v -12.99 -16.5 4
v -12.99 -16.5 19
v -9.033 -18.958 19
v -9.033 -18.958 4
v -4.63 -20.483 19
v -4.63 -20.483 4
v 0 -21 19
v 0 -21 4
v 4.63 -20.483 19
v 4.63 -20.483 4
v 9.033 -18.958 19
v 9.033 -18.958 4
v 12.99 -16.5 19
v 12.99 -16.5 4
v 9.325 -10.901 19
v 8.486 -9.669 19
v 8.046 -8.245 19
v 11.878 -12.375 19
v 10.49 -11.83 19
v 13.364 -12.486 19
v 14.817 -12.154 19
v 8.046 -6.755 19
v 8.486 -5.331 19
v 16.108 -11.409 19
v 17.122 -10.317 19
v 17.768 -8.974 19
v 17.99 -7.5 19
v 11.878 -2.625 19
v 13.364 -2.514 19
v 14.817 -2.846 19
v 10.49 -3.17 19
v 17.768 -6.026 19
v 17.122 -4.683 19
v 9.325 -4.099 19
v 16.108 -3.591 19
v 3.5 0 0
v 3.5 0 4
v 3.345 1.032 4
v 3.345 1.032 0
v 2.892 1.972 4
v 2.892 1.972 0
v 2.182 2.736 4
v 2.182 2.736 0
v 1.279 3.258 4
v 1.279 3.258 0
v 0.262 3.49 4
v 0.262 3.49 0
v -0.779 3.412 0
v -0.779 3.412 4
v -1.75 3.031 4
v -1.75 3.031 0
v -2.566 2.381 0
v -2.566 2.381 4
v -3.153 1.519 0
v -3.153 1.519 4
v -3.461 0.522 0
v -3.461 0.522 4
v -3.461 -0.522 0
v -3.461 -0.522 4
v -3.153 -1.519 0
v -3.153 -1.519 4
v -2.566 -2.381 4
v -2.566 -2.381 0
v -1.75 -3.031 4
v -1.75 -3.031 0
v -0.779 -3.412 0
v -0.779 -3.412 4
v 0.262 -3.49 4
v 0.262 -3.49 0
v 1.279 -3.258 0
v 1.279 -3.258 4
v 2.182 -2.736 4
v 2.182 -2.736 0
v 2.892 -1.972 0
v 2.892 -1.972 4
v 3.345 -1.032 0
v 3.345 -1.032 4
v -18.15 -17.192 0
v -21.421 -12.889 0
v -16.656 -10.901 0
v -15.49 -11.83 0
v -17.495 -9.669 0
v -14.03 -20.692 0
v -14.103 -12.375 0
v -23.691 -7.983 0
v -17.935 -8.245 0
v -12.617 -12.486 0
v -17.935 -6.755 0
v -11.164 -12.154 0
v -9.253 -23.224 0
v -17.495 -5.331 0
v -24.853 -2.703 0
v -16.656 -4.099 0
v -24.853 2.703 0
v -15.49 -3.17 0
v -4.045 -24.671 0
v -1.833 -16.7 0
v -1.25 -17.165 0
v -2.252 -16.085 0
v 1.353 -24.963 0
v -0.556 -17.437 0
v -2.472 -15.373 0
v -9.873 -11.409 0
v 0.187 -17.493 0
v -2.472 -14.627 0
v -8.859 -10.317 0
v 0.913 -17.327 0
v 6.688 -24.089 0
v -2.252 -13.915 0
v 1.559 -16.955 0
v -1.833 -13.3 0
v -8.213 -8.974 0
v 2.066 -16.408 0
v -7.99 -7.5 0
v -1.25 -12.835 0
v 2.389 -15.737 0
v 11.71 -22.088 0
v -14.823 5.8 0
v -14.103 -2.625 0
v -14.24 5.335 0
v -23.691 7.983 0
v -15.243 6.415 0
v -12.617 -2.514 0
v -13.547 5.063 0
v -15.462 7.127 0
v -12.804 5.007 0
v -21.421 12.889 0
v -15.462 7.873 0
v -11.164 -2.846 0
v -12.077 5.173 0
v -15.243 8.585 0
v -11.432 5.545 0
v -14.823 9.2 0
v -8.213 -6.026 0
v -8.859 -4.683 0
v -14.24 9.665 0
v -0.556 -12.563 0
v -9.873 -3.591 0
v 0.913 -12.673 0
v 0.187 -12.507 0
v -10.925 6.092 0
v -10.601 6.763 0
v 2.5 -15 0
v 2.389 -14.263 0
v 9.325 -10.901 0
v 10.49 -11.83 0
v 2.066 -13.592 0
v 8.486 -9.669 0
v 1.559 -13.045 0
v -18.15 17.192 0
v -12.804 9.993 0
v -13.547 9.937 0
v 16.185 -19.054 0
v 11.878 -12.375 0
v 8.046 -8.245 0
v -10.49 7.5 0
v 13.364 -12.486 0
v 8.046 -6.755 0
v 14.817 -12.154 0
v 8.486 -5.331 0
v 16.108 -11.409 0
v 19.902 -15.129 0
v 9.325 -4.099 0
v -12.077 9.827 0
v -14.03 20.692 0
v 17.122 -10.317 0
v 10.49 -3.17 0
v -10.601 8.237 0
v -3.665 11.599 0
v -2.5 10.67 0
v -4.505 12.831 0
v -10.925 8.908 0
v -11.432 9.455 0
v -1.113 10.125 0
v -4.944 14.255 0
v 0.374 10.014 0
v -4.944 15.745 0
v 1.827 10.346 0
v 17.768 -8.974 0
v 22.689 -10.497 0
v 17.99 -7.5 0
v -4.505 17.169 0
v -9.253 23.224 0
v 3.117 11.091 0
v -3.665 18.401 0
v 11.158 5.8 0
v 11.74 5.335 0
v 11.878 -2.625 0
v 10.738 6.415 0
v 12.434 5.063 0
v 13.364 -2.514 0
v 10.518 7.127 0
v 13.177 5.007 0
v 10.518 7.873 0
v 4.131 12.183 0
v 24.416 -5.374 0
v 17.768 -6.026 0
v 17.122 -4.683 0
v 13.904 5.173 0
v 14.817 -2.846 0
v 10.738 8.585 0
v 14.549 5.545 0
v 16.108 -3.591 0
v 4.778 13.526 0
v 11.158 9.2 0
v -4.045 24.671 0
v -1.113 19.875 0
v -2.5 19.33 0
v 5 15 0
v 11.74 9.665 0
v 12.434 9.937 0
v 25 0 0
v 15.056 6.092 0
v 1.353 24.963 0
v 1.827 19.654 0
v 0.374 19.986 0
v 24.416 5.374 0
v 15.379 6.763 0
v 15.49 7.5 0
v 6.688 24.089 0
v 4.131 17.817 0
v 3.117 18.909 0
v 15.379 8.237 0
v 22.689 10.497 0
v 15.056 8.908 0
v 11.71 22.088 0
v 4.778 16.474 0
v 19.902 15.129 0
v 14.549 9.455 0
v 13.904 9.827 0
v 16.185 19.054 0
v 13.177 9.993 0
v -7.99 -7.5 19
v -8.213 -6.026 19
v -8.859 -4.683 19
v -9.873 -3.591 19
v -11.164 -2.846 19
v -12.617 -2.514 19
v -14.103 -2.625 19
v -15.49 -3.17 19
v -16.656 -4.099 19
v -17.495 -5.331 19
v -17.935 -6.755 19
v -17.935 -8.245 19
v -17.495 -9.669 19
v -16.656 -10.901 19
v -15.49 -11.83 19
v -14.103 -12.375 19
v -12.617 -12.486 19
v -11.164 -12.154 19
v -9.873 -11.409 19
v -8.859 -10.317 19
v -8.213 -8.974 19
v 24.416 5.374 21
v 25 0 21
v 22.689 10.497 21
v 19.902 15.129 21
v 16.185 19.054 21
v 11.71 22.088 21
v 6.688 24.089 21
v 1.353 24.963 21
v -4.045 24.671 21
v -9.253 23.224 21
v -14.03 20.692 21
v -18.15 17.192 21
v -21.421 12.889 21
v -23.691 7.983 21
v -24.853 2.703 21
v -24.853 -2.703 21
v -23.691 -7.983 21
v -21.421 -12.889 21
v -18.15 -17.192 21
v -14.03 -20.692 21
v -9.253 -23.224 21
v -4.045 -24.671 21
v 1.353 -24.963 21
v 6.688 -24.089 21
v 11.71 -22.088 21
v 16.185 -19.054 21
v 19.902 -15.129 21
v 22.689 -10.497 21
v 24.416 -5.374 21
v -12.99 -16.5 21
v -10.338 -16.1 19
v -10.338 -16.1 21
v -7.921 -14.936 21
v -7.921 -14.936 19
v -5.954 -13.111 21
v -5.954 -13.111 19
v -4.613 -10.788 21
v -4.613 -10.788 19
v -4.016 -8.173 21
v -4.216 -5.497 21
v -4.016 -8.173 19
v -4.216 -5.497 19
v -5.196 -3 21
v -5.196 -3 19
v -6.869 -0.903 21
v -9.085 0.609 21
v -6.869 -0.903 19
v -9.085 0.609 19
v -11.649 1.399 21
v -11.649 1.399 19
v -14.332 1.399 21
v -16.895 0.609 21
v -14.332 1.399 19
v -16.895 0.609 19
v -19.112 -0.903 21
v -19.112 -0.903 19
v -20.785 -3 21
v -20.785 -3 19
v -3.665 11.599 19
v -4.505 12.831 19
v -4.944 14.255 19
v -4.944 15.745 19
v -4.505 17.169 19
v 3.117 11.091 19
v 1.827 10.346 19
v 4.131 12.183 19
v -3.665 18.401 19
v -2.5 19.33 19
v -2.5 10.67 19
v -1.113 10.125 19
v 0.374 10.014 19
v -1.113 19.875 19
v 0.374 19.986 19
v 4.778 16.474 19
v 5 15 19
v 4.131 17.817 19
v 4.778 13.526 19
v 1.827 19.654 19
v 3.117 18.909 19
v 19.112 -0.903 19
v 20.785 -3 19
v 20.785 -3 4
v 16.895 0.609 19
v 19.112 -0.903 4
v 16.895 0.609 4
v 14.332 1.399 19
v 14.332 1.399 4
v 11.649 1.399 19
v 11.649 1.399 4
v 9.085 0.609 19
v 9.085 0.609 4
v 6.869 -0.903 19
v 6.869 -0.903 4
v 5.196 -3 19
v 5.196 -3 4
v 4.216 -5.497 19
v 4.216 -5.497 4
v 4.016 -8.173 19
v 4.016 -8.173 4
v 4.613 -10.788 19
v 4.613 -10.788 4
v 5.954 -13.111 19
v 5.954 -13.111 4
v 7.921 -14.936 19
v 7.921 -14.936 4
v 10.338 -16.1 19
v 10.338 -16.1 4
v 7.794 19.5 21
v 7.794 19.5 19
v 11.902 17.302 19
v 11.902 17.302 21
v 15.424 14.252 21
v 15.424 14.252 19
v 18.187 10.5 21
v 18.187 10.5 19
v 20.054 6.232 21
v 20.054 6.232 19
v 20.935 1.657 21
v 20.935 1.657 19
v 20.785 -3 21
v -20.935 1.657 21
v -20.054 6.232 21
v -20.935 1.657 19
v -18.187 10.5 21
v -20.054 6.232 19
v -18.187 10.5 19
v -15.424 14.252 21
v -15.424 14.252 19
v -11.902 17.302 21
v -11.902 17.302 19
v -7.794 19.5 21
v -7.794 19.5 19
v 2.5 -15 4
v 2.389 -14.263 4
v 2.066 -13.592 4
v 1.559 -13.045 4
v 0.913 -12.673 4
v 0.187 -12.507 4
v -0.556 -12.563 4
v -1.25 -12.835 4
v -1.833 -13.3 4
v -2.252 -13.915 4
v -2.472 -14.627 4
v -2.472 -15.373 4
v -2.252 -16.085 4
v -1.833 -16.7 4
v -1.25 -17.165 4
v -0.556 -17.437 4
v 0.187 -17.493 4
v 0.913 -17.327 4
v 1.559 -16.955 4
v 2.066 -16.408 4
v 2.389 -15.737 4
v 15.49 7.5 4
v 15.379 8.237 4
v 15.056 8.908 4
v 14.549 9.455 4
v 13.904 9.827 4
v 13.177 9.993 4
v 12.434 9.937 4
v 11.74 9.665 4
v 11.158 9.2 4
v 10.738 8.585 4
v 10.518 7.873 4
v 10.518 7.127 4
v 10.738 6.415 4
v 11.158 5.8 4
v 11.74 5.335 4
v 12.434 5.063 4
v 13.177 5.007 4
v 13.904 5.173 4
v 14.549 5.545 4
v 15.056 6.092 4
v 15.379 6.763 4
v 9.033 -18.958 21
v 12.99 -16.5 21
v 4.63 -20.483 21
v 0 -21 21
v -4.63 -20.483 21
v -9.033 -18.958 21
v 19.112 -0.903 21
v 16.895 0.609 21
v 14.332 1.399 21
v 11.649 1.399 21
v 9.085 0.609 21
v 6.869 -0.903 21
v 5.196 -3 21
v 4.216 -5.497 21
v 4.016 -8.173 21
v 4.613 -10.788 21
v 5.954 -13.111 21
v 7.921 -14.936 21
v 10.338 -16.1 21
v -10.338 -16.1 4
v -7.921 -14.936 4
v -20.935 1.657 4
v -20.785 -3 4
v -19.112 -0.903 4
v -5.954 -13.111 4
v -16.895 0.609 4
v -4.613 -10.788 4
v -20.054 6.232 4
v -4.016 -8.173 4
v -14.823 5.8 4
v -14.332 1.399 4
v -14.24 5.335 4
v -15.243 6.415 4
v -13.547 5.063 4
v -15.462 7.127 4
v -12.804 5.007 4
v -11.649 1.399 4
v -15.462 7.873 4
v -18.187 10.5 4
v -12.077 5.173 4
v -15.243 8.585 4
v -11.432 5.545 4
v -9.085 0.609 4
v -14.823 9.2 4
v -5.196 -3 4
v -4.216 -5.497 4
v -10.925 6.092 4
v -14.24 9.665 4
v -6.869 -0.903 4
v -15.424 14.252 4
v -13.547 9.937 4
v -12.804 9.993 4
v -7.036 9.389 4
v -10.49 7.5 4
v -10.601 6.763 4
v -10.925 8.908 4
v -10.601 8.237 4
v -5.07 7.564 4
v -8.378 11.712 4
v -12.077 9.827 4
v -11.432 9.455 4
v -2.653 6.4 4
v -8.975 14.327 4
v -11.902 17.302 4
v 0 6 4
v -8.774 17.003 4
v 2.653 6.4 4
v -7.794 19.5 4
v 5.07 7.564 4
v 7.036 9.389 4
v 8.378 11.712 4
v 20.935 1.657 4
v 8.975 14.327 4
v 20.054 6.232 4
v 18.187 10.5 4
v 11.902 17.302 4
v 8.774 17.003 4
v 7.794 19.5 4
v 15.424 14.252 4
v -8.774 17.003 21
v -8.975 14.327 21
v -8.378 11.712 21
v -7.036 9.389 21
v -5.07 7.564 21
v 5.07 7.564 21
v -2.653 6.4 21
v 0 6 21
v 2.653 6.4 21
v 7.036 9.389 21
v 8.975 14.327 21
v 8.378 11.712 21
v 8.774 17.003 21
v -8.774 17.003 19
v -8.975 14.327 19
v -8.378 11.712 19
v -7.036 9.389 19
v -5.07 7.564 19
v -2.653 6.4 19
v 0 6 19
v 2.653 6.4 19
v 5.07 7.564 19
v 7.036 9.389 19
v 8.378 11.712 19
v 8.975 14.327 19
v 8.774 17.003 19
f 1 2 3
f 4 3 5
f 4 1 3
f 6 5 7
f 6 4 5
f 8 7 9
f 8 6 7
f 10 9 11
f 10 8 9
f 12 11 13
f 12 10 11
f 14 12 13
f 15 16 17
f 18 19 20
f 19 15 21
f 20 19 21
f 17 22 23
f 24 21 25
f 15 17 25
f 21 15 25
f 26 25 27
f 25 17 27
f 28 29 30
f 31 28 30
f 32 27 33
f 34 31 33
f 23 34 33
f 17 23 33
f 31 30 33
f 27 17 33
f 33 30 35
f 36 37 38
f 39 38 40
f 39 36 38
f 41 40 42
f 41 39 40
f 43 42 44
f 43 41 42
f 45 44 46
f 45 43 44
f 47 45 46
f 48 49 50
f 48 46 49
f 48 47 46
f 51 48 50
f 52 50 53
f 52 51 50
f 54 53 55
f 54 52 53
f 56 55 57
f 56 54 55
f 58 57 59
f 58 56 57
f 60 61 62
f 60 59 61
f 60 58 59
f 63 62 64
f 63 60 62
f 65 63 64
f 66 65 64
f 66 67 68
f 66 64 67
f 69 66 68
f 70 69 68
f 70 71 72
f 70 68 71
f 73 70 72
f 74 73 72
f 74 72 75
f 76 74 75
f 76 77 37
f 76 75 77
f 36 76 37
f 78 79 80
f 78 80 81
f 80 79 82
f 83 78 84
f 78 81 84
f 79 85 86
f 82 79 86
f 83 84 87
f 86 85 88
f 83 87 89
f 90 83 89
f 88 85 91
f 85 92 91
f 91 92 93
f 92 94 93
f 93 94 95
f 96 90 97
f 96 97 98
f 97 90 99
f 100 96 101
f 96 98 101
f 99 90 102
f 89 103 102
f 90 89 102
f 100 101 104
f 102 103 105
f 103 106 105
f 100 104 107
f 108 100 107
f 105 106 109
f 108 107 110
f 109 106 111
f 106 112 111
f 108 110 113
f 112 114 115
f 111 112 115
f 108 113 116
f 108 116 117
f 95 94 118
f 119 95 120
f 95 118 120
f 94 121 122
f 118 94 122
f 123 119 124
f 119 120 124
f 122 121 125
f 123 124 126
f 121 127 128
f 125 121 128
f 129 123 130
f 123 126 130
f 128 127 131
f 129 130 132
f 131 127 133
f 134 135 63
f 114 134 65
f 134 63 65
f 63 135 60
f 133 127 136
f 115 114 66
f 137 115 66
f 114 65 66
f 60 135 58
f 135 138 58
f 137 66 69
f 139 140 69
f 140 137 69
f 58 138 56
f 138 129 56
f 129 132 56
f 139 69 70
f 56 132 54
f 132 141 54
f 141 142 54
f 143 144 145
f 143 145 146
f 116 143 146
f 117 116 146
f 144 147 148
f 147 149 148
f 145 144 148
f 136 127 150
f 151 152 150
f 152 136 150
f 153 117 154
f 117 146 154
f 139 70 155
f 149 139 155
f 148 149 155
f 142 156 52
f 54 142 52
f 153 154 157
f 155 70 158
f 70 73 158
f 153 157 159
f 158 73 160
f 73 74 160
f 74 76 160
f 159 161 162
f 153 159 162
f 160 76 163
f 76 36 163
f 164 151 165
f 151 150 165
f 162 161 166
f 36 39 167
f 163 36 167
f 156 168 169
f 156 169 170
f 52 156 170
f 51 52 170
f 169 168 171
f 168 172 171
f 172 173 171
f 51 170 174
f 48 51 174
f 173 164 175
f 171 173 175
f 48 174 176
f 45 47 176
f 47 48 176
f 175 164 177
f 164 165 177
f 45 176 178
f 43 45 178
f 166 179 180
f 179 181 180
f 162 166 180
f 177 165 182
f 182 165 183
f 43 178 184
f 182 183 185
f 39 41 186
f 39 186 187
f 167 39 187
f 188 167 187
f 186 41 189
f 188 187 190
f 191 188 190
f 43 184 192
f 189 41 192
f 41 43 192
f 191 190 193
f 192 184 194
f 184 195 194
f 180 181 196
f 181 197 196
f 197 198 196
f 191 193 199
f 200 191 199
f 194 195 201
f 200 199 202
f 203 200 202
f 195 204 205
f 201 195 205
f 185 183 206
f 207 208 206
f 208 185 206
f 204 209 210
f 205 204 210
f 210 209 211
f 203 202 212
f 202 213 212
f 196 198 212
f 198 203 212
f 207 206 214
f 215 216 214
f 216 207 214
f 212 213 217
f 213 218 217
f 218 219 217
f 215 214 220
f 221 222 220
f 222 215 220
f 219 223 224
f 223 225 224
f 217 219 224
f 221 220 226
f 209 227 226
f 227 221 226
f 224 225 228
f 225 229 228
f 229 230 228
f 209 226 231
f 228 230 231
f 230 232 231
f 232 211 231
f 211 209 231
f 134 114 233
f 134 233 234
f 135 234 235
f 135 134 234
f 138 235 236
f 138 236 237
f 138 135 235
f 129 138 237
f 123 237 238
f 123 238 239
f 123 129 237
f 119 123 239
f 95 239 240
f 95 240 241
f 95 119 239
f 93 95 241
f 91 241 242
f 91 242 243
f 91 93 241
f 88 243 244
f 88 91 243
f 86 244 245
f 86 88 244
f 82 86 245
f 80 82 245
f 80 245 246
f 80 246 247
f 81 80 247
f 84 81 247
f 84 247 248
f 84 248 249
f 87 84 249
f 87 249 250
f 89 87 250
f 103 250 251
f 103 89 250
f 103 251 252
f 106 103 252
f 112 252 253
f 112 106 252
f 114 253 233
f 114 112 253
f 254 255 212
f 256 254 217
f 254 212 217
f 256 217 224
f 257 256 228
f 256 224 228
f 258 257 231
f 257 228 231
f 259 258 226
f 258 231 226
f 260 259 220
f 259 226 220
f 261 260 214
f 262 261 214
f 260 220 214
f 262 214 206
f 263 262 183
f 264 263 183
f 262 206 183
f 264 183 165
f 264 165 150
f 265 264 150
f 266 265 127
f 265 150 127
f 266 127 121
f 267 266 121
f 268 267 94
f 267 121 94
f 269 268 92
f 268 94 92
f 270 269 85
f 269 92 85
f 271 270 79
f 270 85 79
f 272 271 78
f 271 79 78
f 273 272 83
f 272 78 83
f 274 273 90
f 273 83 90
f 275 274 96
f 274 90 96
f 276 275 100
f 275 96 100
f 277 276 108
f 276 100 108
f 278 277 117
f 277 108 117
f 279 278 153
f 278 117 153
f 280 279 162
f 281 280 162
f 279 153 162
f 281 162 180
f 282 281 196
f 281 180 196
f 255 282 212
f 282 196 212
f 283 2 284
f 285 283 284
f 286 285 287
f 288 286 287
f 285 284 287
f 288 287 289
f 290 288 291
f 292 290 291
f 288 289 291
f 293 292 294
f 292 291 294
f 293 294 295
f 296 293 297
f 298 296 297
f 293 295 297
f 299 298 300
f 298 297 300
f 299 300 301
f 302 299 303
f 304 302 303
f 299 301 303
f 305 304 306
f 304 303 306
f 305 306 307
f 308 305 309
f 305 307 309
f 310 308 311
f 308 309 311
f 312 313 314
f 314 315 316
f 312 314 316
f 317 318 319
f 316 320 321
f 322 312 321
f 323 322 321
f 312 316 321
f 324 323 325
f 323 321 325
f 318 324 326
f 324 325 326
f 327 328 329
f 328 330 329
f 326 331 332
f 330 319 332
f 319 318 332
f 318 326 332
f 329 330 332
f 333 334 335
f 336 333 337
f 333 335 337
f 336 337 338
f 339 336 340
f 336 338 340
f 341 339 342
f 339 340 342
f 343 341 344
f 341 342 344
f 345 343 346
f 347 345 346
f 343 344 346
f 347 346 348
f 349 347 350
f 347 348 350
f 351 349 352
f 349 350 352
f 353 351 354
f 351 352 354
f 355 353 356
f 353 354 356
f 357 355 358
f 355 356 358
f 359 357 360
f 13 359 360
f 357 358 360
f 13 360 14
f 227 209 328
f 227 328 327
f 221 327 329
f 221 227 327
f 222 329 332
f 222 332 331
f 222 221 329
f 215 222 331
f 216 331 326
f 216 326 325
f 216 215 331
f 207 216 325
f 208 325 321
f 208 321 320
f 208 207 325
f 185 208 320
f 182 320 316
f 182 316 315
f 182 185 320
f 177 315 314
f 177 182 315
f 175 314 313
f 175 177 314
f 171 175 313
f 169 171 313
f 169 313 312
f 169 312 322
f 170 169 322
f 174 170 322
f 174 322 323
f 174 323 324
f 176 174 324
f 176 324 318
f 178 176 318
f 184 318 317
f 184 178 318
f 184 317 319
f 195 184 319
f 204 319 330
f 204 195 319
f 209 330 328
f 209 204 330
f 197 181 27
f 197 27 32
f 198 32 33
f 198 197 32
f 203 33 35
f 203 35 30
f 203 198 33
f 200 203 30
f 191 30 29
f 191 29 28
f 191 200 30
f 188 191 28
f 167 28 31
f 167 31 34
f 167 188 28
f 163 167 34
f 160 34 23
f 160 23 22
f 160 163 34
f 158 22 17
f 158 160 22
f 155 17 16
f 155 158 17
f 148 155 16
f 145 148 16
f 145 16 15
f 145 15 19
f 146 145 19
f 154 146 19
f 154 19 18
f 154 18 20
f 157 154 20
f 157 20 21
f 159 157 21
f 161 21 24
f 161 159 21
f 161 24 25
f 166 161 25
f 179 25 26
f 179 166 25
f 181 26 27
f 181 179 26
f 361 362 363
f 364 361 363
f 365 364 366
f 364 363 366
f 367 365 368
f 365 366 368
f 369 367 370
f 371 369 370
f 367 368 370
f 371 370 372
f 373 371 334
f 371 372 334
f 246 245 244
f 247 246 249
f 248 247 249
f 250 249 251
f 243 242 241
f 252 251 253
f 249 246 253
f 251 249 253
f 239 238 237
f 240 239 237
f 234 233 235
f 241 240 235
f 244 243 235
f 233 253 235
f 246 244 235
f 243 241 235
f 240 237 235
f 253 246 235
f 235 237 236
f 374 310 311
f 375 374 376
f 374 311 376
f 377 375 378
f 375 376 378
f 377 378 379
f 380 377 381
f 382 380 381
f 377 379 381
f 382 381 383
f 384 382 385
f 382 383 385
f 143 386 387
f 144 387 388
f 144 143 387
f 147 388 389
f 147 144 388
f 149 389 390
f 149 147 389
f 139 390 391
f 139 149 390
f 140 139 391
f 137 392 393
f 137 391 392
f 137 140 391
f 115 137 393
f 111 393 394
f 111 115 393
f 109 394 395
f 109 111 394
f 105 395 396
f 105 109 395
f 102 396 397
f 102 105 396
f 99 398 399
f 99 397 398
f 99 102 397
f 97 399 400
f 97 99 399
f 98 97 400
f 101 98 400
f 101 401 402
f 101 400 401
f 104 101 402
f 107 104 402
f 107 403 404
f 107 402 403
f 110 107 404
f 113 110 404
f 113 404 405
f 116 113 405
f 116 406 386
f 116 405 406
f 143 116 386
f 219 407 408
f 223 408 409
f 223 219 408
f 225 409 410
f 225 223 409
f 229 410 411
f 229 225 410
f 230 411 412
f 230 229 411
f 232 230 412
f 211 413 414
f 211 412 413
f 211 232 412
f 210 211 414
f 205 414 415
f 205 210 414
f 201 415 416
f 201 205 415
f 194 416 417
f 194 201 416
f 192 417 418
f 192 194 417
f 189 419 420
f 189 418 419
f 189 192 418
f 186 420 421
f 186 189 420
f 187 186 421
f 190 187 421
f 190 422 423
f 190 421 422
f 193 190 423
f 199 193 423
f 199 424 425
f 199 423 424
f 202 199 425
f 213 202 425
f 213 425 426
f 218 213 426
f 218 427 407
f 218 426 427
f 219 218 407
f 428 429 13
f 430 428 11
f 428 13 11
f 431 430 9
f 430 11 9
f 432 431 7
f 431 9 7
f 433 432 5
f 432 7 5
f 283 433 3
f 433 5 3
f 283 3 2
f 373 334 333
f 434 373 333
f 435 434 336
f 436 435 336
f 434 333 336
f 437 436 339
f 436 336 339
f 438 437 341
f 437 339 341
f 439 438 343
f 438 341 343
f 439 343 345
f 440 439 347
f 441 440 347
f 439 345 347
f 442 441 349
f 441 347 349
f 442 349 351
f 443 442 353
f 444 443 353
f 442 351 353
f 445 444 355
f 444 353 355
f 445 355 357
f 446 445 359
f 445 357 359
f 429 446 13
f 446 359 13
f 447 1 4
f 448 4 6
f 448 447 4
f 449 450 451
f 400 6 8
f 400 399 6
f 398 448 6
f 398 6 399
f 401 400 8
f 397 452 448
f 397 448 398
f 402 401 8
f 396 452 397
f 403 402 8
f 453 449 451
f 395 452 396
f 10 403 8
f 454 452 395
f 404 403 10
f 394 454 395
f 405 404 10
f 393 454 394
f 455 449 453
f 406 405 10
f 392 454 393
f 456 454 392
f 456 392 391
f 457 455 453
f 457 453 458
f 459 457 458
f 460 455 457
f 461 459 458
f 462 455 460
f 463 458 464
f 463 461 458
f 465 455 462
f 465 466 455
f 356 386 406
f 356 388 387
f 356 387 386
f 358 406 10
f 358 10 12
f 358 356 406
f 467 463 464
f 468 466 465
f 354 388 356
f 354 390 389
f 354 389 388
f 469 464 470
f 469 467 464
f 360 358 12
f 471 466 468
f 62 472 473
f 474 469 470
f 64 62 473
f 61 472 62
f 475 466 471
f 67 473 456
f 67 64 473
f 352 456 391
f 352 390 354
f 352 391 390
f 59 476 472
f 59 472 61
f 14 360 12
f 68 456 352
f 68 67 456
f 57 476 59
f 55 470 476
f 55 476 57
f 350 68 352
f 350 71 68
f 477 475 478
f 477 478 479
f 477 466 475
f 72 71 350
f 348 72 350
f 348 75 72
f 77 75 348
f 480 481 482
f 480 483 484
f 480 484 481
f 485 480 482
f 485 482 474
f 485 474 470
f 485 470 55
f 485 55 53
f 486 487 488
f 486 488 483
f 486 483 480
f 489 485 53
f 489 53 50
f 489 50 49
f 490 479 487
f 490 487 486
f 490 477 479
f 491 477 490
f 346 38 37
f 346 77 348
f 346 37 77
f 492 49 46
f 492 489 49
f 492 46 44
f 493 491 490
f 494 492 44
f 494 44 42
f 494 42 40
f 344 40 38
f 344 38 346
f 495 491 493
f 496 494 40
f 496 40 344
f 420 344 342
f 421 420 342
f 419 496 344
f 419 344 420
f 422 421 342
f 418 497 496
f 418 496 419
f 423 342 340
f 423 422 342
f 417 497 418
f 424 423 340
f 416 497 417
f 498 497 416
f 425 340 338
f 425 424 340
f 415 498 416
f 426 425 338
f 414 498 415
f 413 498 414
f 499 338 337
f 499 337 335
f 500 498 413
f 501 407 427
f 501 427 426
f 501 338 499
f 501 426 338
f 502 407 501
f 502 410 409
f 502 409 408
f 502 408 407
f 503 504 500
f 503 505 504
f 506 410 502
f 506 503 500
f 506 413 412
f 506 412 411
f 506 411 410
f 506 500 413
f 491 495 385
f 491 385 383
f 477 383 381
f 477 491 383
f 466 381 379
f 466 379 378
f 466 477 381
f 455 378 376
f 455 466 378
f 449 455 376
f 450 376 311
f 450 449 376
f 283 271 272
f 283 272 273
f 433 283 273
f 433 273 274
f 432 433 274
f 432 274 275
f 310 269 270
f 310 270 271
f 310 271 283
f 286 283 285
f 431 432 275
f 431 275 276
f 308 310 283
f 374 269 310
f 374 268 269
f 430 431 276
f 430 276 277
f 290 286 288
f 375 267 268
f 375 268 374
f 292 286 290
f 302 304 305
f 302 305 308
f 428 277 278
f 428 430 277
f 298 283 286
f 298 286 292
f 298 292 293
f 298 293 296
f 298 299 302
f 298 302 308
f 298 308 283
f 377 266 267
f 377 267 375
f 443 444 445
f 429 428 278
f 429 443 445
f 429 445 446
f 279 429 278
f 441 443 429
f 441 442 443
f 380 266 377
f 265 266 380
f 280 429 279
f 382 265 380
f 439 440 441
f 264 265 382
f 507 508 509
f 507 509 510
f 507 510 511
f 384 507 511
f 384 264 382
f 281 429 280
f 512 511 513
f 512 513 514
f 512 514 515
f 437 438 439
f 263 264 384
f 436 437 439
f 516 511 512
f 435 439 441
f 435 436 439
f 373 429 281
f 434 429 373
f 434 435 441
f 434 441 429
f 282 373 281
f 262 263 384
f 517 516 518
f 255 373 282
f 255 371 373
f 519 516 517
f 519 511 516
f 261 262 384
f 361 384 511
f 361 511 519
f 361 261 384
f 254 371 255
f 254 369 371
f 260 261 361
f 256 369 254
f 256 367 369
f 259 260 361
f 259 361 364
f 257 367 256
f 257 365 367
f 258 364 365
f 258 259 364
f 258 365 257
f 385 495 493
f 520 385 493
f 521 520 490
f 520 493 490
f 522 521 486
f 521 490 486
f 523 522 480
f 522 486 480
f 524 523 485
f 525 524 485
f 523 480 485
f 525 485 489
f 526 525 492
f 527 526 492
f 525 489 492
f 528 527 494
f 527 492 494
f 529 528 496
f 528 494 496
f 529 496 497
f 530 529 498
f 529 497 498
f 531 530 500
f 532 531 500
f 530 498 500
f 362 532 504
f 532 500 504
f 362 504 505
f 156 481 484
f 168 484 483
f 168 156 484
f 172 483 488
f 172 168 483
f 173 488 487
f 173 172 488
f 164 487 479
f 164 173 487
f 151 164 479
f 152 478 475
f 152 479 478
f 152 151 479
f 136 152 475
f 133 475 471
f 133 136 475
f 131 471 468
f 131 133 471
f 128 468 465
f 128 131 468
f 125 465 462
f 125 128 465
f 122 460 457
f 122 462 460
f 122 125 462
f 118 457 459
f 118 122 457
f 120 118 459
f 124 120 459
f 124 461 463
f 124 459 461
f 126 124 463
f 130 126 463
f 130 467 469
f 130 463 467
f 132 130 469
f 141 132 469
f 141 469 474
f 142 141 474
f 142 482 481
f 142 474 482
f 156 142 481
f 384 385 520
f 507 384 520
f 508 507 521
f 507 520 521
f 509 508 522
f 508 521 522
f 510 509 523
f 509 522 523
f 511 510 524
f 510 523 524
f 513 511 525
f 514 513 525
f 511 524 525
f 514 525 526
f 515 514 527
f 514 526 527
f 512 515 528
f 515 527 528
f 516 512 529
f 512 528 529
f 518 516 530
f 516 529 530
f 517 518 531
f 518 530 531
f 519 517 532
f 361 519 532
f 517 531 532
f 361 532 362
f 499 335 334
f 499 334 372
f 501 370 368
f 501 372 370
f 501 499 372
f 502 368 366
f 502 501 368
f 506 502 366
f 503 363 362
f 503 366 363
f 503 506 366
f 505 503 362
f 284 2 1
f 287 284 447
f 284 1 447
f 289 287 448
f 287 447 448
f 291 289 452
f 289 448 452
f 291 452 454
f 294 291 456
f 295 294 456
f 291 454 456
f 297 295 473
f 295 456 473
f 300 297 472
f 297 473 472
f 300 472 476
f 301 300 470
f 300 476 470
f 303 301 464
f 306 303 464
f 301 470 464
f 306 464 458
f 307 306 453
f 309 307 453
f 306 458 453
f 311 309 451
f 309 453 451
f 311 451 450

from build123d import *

# Parameters (mm, degrees)
F0_R     = 25
F0_R_2   = 5
F0_R_3   = 2.5
F0_R_4   = 3.5
F1_DEPTH = 19
F2_T     = -4
F3_DEPTH = 25
F4_R     = 25
F5_DEPTH = 2


# Not quite as in the source:
# - a feature names something its author has since deleted; it is built from what else it names


with BuildPart() as f1:
    # F0 (on Top) → F1 (new body)
    with BuildSketch(Plane.XY):
        Circle(F0_R)
        with Locations((-12.990381, -7.5)):
            Circle(F0_R_2, mode=Mode.SUBTRACT)
        with Locations((0, -15)):
            Circle(F0_R_3, mode=Mode.SUBTRACT)
        with Locations((12.990381, -7.5)):
            Circle(F0_R_2, mode=Mode.SUBTRACT)
        with Locations((-12.990381, 7.5)):
            Circle(F0_R_3, mode=Mode.SUBTRACT)
        Circle(F0_R_4, mode=Mode.SUBTRACT)
        with Locations((12.990381, 7.5)):
            Circle(F0_R_3, mode=Mode.SUBTRACT)
        with Locations((0, 15)):
            Circle(F0_R_2, mode=Mode.SUBTRACT)
        Circle(F0_R_4)
        with Locations((-12.990381, 7.5)):
            Circle(F0_R_3)
        with Locations((12.990381, 7.5)):
            Circle(F0_R_3)
        with Locations((0, -15)):
            Circle(F0_R_3)
    extrude(amount=F1_DEPTH)

    # F2
    f2_openings = [f1.faces().sort_by_distance(p)[0] for p in [
        (0, 0, 19),
    ]]
    offset(amount=F2_T, openings=f2_openings)

    # F0 (on Top) → F3 (cut)
    with BuildSketch(Plane.XY):
        with Locations((-12.990381, 7.5)):
            Circle(F0_R_3)
        Circle(F0_R_4)
        with Locations((12.990381, 7.5)):
            Circle(F0_R_3)
        with Locations((0, -15)):
            Circle(F0_R_3)
    extrude(amount=F3_DEPTH, mode=Mode.SUBTRACT)

    # F4 (on face) → F5 (join)
    with BuildSketch(Plane.XY.offset(19)):
        Circle(F4_R)
        with BuildLine():
            ThreePointArc((-20.78461, -3), (-18.186533, 10.5), (-7.794229, 19.5))
            ThreePointArc((-7.794229, 19.5), (0, 6), (7.794229, 19.5))
            ThreePointArc((7.794229, 19.5), (18.186533, 10.5), (20.78461, -3))
            ThreePointArc((20.78461, -3), (5.196152, -3), (12.990381, -16.5))
            ThreePointArc((12.990381, -16.5), (0, -21), (-12.990381, -16.5))
            ThreePointArc((-12.990381, -16.5), (-5.196152, -3), (-20.78461, -3))
        make_face(mode=Mode.SUBTRACT)
    extrude(amount=F5_DEPTH)


solid = f1.part
